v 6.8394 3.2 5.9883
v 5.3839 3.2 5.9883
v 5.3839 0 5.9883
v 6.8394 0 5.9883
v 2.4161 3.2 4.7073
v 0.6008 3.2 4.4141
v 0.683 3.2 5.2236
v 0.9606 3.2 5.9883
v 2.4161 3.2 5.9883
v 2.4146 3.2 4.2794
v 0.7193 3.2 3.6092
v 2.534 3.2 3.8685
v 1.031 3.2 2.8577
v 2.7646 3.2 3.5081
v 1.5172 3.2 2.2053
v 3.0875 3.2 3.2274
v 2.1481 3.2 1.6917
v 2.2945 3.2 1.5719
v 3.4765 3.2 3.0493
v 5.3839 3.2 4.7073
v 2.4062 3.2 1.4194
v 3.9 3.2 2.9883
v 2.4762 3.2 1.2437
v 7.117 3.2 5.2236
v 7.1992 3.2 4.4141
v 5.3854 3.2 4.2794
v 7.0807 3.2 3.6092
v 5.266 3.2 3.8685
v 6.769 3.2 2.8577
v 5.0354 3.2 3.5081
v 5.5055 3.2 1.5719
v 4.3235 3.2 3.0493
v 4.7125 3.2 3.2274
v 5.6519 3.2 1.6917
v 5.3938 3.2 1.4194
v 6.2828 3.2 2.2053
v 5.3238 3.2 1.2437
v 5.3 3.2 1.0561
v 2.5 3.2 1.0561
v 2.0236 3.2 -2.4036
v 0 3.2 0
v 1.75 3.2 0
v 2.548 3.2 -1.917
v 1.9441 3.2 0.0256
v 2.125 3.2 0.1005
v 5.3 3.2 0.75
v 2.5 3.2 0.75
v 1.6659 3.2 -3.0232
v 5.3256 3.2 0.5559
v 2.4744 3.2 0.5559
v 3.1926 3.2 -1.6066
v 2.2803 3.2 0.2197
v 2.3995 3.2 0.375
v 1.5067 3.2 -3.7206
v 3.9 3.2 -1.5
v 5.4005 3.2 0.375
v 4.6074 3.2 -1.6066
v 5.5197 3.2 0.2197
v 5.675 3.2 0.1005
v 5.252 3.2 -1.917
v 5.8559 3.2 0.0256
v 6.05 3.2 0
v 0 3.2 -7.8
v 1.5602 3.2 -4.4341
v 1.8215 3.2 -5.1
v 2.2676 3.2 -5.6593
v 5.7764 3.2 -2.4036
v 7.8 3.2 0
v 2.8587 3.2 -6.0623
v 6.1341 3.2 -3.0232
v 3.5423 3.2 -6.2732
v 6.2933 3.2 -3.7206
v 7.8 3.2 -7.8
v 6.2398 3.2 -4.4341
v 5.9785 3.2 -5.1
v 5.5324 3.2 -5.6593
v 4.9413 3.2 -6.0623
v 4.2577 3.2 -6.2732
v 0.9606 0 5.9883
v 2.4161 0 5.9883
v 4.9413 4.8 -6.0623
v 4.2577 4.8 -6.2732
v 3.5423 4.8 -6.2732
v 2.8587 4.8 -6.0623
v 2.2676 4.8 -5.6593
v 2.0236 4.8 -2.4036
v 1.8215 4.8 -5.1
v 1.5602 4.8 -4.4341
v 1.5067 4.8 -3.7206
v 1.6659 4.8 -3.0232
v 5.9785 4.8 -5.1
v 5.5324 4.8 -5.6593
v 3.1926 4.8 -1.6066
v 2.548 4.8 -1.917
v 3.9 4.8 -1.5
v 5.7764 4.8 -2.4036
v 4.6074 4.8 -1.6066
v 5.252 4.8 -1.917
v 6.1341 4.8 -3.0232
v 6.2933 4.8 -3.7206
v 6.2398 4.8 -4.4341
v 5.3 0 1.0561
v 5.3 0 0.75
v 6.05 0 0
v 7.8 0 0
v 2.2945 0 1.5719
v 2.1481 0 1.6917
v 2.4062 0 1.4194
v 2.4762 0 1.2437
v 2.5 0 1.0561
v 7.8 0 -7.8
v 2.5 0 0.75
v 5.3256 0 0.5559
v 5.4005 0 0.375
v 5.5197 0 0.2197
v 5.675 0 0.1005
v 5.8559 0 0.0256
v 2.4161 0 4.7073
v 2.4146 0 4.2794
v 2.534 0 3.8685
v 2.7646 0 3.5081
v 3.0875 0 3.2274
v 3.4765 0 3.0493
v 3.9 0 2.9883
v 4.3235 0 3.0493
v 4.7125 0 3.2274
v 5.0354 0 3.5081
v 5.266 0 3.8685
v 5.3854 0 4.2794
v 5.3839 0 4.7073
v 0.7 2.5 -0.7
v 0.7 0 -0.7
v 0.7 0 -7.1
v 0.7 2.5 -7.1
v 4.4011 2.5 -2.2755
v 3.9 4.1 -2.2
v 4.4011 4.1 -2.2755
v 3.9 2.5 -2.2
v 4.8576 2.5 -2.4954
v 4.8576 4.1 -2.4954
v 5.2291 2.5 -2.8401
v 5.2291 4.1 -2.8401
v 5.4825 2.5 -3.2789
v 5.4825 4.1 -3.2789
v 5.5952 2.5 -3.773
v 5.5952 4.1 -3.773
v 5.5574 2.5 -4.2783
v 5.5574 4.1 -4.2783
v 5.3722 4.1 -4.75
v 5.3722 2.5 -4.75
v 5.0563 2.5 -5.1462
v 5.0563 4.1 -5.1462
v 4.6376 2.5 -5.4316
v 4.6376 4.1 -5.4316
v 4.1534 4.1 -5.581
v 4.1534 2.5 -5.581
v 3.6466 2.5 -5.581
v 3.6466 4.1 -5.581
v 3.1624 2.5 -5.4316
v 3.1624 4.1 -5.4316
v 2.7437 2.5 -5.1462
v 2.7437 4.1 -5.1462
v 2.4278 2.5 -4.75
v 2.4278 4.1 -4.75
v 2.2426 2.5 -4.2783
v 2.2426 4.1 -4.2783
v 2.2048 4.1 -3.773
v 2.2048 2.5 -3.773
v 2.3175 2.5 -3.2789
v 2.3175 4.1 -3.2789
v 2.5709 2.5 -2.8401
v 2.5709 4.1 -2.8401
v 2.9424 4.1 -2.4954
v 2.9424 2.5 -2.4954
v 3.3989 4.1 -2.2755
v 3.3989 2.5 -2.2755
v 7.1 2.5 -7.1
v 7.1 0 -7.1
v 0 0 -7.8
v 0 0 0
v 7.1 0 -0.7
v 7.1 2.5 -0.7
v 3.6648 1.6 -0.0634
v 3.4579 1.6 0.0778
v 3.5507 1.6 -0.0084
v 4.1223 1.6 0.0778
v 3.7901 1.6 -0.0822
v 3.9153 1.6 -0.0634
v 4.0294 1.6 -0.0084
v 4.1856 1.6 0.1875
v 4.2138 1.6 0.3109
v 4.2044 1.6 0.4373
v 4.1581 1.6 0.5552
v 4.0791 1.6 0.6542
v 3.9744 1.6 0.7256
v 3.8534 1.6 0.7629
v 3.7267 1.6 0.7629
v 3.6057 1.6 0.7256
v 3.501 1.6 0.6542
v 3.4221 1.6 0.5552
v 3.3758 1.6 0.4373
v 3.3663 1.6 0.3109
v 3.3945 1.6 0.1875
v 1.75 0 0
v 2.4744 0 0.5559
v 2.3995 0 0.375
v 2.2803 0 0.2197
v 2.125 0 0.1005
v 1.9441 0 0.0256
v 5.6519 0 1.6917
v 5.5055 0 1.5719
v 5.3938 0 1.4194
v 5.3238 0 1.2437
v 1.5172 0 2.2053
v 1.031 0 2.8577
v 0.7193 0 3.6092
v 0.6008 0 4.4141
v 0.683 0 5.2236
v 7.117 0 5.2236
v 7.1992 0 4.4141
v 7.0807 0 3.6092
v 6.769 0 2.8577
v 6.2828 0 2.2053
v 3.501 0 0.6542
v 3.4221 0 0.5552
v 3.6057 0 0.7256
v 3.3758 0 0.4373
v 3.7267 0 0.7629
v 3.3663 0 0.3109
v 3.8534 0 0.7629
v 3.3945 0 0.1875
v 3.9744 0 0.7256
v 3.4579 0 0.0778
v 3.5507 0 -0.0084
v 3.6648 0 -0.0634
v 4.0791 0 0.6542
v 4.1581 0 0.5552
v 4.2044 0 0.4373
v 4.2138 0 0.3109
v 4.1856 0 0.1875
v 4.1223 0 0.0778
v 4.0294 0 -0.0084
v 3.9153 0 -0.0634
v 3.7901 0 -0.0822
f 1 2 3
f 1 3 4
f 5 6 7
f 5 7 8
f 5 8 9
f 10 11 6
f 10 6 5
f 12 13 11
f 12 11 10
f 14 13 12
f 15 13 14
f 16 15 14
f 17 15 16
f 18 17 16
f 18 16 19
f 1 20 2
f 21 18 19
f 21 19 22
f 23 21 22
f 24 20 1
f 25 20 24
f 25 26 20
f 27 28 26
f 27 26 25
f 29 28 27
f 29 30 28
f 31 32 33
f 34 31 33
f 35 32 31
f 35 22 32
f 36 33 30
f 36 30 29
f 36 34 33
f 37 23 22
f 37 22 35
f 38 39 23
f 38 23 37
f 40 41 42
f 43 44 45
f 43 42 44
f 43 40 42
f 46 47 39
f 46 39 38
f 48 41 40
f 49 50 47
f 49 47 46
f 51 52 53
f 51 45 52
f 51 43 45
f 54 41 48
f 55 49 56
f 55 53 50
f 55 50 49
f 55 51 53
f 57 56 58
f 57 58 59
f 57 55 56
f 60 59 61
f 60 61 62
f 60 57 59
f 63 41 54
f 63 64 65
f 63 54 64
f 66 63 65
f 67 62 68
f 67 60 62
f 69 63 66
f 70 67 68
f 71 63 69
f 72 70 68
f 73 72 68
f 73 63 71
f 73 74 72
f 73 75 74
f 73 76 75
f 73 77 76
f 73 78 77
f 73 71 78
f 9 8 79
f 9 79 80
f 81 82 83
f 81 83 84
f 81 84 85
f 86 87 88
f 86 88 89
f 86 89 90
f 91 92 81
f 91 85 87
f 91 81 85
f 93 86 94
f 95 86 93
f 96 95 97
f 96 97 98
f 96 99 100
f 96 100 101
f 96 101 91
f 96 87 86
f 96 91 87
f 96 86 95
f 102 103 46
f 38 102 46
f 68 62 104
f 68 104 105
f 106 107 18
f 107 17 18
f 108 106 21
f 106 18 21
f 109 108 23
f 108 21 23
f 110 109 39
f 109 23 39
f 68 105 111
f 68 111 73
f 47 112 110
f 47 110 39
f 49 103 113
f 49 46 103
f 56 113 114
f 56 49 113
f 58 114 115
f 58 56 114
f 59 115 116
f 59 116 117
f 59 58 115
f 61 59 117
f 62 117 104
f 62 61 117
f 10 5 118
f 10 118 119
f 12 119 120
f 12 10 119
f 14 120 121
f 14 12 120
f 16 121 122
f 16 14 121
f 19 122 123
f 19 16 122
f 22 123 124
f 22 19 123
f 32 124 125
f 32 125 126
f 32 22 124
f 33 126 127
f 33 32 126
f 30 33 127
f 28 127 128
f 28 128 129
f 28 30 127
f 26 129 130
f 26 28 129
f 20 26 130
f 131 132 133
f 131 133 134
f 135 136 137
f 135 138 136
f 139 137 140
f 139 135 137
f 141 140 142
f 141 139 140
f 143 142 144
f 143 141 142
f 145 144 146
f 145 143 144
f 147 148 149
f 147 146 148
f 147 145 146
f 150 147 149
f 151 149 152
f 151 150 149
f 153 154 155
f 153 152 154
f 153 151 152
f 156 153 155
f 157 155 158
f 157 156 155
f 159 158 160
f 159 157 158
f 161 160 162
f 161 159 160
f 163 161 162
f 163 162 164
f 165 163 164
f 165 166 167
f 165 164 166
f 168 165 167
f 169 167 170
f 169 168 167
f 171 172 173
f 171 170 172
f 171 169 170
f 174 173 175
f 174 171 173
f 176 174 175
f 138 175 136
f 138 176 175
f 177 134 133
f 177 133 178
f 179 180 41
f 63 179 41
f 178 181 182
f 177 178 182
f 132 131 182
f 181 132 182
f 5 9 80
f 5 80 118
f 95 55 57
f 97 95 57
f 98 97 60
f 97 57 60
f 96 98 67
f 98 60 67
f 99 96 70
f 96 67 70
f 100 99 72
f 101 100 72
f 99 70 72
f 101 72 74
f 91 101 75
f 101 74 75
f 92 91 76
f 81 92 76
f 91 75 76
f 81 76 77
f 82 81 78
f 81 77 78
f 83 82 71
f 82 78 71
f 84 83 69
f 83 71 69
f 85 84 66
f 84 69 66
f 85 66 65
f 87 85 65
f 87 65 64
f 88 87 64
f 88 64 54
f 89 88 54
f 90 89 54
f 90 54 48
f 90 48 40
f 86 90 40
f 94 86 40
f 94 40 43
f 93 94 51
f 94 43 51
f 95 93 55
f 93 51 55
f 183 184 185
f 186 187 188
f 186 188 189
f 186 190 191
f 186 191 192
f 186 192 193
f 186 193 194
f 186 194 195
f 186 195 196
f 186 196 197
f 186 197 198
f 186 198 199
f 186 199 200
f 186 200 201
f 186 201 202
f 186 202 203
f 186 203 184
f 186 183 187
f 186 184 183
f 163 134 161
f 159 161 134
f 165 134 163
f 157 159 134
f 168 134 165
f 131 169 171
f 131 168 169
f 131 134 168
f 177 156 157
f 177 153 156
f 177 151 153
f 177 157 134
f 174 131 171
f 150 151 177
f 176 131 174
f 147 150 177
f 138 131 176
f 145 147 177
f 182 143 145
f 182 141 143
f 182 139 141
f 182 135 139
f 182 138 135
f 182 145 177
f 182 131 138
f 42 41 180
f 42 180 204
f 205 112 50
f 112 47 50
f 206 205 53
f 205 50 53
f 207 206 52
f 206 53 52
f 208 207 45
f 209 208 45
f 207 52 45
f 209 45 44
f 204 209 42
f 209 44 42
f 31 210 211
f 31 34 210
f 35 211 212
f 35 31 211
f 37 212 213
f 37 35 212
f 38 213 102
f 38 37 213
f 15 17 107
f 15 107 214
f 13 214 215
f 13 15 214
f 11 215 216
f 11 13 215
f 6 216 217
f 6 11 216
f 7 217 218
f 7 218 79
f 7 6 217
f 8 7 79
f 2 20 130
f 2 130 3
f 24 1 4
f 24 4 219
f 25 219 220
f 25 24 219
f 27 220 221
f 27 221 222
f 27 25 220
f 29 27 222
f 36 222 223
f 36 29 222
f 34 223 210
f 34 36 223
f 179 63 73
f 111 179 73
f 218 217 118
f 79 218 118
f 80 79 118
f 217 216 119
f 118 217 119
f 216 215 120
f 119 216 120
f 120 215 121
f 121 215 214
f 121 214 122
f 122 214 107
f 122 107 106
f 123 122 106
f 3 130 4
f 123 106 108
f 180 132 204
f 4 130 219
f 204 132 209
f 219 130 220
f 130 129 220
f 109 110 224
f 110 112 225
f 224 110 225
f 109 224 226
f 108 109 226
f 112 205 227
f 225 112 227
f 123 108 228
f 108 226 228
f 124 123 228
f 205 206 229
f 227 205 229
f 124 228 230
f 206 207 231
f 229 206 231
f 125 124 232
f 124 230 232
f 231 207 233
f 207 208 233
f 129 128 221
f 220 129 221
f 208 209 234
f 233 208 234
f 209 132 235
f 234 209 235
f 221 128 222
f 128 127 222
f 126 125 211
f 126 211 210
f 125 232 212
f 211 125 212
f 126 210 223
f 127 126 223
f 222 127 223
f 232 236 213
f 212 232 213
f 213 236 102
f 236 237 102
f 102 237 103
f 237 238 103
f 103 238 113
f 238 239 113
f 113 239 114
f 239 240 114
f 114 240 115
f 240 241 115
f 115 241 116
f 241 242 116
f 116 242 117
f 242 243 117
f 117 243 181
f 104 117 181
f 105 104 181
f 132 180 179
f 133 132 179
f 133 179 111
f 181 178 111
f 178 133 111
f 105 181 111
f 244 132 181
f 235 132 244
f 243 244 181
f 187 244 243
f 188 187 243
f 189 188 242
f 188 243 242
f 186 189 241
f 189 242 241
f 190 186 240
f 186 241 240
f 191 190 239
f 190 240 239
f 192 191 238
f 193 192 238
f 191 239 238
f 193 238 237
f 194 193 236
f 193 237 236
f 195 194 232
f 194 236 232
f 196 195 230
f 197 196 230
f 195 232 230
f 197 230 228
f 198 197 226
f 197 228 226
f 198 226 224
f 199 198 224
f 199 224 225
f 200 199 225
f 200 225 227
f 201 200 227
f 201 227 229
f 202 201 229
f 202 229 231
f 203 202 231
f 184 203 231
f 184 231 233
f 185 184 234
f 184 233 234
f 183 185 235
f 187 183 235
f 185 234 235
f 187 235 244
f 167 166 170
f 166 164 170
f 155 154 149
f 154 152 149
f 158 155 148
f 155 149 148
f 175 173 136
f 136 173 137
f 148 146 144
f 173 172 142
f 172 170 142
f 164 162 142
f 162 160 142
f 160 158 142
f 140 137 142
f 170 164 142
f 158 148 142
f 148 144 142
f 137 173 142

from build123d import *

# Parameters (mm, degrees)
SKETCH1_W           = 7.8
SKETCH1_H           = 3.2
BOSS_EXTRUDE1_DEPTH = 7.8
SKETCH2_R           = 2.4
BOSS_EXTRUDE2_DEPTH = 1.6
SHELL1_T            = -0.7
SKETCH3_W           = 2.8
SKETCH3_H           = 3.2
BOSS_EXTRUDE3_DEPTH = 1.5
BOSS_EXTRUDE4_DEPTH = 3.2
FILLET1_R           = 0.75
FILLET2_R           = 0.75
SKETCH6_R           = 0.424931422
CUT_EXTRUDE1_DEPTH  = 1.6


with BuildPart() as part:
    # Sketch1 → Boss-Extrude1 (new body)
    with BuildSketch(Plane.XY):
        with Locations((3.9, 1.6)):
            Rectangle(SKETCH1_W, SKETCH1_H)
    extrude(amount=-BOSS_EXTRUDE1_DEPTH)

    # Sketch2 → Boss-Extrude2 (add)
    with BuildSketch(Plane(origin=(0, 3.2, 0), x_dir=(1, 0, 0), z_dir=(0, 1, 0))):
        with Locations(Location((3.9, 3.9, 0), (0, 0, 270))):
            Circle(SKETCH2_R)
    extrude(amount=BOSS_EXTRUDE2_DEPTH)

    # Shell1
    shell1_openings = [part.faces().sort_by_distance(p)[0] for p in [
        (3.9, 0, -3.9),
    ]]
    offset(amount=SHELL1_T, openings=shell1_openings, kind=Kind.INTERSECTION)

    # Sketch3 → Boss-Extrude3 (add)
    with BuildSketch(Plane.XY):
        with Locations((3.9, 1.6)):
            Rectangle(SKETCH3_W, SKETCH3_H)
    extrude(amount=BOSS_EXTRUDE3_DEPTH)

    # Sketch5 → Boss-Extrude4 (add)
    with BuildSketch(Plane(origin=(0, 3.2, 0), x_dir=(1, 0, 0), z_dir=(0, 1, 0))):
        with BuildLine():
            Line((0.960612309, -5.988310559), (2.416065979, -5.988310559))
            Line((2.416065979, -5.988310559), (2.416065979, -4.707262204))
            ThreePointArc((2.416065979, -4.707262204), (3.9, -2.988310559), (5.383934021, -4.707262204))
            Line((5.383934021, -4.707262204), (5.383934021, -5.988310559))
            Line((5.383934021, -5.988310559), (6.839387691, -5.988310559))
            ThreePointArc((6.839387691, -5.988310559), (3.9, -1.188310559), (0.960612309, -5.988310559))
        make_face()
    extrude(amount=-BOSS_EXTRUDE4_DEPTH)

    # Fillet1
    fillet1_edges = [part.edges().sort_by_distance(p)[0] for p in [
        (2.5, 1.6, 0),
        (2.5, 1.6, 1.5),
    ]]
    fillet(fillet1_edges, radius=FILLET1_R)

    # Fillet2
    fillet2_edges = [part.edges().sort_by_distance(p)[0] for p in [
        (5.3, 1.6, 0),
        (5.3, 1.6, 1.5),
    ]]
    fillet(fillet2_edges, radius=FILLET2_R)

    # Sketch6 → Cut-Extrude1 (cut)
    with BuildSketch(Plane.XZ):
        with Locations(Location((3.7900748, 0.342701654, 0), (0, 0, 270))):
            Circle(SKETCH6_R)
    extrude(amount=-CUT_EXTRUDE1_DEPTH, mode=Mode.SUBTRACT)


solid = part.part
